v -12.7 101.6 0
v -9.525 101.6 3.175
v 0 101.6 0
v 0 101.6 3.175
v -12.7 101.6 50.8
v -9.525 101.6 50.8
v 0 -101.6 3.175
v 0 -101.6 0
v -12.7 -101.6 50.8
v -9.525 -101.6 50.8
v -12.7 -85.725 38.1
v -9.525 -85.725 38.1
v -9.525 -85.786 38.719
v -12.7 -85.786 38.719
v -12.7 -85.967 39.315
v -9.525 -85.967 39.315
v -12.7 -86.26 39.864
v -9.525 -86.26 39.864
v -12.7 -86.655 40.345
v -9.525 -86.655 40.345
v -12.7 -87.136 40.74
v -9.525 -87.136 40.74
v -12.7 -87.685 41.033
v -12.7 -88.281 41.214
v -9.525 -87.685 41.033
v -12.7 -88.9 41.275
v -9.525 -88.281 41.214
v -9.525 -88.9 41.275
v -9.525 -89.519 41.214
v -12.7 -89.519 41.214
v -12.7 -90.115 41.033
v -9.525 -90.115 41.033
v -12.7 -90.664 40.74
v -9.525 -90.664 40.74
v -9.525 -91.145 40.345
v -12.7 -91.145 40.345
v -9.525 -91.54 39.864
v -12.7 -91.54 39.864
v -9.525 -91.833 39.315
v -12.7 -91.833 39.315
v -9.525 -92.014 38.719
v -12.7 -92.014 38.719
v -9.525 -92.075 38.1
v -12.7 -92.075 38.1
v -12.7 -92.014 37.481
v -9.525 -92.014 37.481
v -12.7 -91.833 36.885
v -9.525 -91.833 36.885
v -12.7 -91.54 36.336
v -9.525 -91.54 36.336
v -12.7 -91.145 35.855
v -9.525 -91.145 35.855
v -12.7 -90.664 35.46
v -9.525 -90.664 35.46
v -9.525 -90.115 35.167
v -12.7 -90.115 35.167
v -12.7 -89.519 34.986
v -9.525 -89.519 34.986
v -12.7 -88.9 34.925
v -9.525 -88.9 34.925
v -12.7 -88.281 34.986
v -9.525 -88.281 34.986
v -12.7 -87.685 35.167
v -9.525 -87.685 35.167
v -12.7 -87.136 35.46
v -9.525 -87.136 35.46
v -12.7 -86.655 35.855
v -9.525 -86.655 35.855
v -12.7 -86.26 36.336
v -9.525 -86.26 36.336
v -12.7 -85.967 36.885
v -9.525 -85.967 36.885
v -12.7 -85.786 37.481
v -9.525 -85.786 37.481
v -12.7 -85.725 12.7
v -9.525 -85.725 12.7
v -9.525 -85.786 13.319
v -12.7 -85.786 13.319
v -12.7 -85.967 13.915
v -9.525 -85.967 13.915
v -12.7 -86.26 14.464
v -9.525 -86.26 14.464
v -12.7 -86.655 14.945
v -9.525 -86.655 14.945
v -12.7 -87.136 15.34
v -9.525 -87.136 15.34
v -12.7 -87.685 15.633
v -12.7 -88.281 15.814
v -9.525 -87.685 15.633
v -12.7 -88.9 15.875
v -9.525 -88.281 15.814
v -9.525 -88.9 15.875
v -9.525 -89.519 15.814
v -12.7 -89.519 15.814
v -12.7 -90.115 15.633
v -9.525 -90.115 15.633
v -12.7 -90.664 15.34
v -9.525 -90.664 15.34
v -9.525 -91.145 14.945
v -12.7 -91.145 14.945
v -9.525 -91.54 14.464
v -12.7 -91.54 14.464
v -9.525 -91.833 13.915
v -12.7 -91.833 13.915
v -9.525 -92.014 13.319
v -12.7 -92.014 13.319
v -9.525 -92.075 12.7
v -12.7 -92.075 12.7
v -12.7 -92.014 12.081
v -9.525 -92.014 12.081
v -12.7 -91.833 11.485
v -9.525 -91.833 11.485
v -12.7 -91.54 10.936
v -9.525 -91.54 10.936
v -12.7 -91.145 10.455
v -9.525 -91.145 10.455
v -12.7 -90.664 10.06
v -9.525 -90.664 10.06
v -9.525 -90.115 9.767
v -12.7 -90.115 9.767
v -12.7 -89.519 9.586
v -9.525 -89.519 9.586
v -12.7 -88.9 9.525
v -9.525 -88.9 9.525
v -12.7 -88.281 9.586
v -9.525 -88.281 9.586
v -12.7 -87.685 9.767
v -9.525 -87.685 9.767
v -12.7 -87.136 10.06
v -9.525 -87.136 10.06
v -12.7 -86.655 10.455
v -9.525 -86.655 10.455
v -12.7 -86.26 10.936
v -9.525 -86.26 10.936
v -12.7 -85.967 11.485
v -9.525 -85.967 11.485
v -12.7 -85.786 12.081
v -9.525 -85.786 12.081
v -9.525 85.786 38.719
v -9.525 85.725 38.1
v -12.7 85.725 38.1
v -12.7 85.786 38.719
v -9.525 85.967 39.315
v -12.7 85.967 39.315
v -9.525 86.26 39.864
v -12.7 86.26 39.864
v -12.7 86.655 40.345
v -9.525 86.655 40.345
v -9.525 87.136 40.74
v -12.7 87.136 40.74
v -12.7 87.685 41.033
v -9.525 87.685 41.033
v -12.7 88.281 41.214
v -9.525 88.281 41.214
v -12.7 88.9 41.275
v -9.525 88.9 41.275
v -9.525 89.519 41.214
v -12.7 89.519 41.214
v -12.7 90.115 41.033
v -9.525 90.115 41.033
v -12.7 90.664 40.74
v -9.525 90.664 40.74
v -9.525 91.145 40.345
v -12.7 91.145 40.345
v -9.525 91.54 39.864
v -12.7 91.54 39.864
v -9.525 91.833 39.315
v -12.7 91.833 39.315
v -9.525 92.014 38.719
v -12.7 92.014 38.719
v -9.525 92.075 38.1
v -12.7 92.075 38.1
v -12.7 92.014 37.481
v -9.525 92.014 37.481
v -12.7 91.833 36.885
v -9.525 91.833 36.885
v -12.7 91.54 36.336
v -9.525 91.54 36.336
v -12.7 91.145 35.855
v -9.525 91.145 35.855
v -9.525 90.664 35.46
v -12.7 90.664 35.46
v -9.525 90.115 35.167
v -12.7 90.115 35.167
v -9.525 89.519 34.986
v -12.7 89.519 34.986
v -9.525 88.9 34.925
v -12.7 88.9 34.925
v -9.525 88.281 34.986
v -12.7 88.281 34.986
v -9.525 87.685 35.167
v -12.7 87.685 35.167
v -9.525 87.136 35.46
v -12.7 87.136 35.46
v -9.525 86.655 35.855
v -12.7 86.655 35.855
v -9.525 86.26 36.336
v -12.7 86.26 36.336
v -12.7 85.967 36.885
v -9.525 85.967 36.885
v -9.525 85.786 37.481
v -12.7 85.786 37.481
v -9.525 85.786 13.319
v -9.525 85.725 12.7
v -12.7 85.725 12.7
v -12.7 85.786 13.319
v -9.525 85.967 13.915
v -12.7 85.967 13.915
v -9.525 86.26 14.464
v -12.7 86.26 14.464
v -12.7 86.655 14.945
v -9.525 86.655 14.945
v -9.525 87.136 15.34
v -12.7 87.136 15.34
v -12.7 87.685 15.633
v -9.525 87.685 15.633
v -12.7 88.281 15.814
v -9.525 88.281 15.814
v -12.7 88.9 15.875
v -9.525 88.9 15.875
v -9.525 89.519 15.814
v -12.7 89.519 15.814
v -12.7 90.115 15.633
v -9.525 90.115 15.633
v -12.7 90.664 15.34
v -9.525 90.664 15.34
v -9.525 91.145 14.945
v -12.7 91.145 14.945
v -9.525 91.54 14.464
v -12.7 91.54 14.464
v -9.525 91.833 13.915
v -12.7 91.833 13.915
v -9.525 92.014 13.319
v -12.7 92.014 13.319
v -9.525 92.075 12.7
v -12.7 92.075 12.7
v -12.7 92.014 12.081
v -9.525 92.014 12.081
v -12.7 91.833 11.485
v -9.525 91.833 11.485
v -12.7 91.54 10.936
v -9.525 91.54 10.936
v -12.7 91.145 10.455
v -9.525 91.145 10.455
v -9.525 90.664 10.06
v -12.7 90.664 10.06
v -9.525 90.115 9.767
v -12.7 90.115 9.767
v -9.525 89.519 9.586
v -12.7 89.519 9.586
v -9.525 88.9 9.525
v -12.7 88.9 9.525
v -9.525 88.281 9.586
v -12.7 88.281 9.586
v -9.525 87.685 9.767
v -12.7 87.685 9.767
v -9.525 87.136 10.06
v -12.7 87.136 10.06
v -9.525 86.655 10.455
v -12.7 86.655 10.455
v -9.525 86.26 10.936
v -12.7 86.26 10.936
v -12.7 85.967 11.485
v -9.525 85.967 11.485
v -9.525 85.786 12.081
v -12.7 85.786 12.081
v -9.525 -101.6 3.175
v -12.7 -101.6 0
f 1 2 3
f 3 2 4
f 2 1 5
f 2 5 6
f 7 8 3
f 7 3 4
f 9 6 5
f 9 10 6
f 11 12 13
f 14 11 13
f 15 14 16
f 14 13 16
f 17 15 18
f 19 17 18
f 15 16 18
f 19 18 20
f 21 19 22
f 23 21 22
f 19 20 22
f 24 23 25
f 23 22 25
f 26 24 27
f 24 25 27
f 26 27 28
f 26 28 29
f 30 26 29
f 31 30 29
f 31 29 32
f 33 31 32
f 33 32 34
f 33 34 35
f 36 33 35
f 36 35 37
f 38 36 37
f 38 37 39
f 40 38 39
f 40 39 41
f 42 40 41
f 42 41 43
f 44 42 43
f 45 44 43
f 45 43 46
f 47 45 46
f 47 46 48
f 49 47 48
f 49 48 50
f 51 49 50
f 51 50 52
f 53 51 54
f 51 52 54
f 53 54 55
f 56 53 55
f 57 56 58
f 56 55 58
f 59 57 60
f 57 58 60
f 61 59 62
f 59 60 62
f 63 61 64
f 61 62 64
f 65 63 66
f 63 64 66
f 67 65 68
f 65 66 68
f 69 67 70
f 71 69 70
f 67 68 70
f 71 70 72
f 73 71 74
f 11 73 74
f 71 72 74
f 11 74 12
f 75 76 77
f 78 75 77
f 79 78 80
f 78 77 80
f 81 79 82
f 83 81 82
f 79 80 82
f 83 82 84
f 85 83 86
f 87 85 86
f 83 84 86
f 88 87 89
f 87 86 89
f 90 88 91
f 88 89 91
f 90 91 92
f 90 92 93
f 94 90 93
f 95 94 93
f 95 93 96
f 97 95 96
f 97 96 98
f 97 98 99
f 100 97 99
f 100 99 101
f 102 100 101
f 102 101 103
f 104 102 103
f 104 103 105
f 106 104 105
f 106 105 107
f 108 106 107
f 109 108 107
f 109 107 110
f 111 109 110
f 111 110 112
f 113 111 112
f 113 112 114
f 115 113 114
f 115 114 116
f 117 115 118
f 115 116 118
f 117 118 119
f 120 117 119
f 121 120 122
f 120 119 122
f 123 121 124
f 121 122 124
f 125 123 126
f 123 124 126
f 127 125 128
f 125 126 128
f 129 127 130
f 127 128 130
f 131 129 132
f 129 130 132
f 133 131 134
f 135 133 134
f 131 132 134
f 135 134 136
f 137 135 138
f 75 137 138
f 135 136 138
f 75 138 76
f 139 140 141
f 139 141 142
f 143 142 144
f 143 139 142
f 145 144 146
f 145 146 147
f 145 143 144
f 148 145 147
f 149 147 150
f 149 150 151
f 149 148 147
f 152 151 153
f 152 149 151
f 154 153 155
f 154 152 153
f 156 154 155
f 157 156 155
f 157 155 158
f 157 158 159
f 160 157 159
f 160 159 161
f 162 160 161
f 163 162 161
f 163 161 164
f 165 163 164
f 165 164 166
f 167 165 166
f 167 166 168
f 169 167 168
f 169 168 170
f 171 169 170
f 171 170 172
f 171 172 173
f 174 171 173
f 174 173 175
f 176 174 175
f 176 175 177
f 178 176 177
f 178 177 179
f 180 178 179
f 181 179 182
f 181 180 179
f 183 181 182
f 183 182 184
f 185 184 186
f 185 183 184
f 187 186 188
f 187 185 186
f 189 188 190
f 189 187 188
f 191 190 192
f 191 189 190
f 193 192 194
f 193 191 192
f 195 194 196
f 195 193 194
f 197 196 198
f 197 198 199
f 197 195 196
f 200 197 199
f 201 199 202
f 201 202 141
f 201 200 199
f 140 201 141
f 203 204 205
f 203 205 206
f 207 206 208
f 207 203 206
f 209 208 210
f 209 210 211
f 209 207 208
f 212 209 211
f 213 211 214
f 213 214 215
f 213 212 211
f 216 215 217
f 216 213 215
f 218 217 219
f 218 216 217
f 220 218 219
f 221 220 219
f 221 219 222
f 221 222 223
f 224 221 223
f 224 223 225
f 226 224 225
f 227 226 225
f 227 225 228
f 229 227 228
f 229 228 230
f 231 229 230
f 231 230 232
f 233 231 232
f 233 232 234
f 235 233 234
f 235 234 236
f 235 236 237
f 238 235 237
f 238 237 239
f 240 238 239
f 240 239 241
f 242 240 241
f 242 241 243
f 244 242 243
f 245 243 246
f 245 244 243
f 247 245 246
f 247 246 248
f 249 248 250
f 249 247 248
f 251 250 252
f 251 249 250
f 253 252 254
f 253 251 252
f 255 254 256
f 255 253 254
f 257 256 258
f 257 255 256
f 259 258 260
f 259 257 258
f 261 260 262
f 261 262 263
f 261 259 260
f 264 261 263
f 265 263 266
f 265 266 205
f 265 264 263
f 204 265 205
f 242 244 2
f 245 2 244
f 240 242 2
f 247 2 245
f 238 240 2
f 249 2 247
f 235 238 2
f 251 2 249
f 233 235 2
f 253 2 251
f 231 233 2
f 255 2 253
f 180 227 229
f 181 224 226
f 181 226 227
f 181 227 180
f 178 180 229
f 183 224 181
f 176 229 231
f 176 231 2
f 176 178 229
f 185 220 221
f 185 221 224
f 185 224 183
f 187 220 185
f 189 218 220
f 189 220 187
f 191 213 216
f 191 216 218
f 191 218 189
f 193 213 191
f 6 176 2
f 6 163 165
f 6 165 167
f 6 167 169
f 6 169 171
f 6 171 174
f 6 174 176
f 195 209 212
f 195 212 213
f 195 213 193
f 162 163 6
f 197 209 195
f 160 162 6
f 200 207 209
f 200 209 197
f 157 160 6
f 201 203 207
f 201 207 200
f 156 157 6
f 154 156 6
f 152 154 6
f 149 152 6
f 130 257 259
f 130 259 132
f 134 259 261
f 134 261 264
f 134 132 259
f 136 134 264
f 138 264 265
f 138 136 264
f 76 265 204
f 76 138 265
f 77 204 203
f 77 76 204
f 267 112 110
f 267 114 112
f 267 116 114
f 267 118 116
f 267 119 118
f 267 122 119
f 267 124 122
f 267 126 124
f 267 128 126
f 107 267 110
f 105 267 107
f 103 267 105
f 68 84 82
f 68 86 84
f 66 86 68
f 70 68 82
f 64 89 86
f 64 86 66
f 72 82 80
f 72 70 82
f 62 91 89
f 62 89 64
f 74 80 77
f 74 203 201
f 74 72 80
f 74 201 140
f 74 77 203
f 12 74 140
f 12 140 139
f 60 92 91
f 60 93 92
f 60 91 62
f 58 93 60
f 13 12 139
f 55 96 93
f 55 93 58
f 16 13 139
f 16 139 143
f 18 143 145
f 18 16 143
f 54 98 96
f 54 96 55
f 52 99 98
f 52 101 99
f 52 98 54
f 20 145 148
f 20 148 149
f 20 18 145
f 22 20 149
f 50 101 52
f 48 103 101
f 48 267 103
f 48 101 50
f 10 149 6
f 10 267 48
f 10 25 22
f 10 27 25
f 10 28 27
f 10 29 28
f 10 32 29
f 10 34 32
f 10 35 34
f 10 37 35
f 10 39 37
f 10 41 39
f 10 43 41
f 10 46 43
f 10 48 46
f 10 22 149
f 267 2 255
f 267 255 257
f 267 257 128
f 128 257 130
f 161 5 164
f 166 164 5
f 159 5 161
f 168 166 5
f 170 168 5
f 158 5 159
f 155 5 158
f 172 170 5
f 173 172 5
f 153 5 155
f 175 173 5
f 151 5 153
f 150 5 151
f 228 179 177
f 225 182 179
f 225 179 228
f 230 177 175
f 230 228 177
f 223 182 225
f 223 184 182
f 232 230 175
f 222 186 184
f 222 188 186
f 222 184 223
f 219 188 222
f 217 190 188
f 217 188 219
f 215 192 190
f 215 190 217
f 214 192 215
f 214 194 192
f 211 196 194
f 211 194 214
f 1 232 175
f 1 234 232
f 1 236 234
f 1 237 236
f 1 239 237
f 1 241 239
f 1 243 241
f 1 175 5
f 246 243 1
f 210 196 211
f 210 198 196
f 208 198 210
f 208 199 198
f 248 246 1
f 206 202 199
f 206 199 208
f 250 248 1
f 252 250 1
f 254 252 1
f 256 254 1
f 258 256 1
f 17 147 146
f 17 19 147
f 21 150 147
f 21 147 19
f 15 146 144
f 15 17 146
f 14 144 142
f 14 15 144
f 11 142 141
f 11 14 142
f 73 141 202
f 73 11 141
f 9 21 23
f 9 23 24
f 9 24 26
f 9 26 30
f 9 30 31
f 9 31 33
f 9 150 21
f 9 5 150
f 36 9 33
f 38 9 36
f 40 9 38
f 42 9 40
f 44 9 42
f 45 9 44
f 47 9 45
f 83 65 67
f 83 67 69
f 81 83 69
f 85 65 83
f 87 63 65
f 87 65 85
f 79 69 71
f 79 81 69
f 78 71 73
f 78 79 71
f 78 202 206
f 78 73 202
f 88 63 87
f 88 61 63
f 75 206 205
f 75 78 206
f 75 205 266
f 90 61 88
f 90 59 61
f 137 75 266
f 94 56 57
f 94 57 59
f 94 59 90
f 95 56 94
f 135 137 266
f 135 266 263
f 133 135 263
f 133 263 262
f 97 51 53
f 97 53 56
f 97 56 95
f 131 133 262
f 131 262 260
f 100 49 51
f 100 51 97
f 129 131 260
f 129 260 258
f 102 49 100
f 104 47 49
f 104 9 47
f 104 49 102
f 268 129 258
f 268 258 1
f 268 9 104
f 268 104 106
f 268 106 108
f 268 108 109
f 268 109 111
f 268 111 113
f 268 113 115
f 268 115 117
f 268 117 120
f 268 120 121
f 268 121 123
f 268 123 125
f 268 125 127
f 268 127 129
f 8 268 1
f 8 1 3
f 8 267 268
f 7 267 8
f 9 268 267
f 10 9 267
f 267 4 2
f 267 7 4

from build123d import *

# Parameters (mm, degrees)
F1_DEPTH = 101.6
F3_D     = 6.35


with BuildPart() as f1:
    # F0 (on Front) → F1 (new body)
    with BuildSketch(Plane.XZ):
        Polygon((-9.525, 50.8), (-12.7, 50.8), (-12.7, 0), (0, 0), (0, 3.175), (-9.525, 3.175), align=None)
    extrude(amount=F1_DEPTH)

    # F3 (through all)
    with Locations(Plane(origin=(-12.7, 0, 0), x_dir=(0, -1, 0), z_dir=(-1, 0, 0))):
        with Locations((88.9, 38.1), (88.9, 12.7)):
            Hole(F3_D / 2)

    # F4: F1 across plane


with BuildPart() as f1_1:
    add(f1.part)
    add(f1.part.mirror(Plane.XZ))


solid = f1_1.part
